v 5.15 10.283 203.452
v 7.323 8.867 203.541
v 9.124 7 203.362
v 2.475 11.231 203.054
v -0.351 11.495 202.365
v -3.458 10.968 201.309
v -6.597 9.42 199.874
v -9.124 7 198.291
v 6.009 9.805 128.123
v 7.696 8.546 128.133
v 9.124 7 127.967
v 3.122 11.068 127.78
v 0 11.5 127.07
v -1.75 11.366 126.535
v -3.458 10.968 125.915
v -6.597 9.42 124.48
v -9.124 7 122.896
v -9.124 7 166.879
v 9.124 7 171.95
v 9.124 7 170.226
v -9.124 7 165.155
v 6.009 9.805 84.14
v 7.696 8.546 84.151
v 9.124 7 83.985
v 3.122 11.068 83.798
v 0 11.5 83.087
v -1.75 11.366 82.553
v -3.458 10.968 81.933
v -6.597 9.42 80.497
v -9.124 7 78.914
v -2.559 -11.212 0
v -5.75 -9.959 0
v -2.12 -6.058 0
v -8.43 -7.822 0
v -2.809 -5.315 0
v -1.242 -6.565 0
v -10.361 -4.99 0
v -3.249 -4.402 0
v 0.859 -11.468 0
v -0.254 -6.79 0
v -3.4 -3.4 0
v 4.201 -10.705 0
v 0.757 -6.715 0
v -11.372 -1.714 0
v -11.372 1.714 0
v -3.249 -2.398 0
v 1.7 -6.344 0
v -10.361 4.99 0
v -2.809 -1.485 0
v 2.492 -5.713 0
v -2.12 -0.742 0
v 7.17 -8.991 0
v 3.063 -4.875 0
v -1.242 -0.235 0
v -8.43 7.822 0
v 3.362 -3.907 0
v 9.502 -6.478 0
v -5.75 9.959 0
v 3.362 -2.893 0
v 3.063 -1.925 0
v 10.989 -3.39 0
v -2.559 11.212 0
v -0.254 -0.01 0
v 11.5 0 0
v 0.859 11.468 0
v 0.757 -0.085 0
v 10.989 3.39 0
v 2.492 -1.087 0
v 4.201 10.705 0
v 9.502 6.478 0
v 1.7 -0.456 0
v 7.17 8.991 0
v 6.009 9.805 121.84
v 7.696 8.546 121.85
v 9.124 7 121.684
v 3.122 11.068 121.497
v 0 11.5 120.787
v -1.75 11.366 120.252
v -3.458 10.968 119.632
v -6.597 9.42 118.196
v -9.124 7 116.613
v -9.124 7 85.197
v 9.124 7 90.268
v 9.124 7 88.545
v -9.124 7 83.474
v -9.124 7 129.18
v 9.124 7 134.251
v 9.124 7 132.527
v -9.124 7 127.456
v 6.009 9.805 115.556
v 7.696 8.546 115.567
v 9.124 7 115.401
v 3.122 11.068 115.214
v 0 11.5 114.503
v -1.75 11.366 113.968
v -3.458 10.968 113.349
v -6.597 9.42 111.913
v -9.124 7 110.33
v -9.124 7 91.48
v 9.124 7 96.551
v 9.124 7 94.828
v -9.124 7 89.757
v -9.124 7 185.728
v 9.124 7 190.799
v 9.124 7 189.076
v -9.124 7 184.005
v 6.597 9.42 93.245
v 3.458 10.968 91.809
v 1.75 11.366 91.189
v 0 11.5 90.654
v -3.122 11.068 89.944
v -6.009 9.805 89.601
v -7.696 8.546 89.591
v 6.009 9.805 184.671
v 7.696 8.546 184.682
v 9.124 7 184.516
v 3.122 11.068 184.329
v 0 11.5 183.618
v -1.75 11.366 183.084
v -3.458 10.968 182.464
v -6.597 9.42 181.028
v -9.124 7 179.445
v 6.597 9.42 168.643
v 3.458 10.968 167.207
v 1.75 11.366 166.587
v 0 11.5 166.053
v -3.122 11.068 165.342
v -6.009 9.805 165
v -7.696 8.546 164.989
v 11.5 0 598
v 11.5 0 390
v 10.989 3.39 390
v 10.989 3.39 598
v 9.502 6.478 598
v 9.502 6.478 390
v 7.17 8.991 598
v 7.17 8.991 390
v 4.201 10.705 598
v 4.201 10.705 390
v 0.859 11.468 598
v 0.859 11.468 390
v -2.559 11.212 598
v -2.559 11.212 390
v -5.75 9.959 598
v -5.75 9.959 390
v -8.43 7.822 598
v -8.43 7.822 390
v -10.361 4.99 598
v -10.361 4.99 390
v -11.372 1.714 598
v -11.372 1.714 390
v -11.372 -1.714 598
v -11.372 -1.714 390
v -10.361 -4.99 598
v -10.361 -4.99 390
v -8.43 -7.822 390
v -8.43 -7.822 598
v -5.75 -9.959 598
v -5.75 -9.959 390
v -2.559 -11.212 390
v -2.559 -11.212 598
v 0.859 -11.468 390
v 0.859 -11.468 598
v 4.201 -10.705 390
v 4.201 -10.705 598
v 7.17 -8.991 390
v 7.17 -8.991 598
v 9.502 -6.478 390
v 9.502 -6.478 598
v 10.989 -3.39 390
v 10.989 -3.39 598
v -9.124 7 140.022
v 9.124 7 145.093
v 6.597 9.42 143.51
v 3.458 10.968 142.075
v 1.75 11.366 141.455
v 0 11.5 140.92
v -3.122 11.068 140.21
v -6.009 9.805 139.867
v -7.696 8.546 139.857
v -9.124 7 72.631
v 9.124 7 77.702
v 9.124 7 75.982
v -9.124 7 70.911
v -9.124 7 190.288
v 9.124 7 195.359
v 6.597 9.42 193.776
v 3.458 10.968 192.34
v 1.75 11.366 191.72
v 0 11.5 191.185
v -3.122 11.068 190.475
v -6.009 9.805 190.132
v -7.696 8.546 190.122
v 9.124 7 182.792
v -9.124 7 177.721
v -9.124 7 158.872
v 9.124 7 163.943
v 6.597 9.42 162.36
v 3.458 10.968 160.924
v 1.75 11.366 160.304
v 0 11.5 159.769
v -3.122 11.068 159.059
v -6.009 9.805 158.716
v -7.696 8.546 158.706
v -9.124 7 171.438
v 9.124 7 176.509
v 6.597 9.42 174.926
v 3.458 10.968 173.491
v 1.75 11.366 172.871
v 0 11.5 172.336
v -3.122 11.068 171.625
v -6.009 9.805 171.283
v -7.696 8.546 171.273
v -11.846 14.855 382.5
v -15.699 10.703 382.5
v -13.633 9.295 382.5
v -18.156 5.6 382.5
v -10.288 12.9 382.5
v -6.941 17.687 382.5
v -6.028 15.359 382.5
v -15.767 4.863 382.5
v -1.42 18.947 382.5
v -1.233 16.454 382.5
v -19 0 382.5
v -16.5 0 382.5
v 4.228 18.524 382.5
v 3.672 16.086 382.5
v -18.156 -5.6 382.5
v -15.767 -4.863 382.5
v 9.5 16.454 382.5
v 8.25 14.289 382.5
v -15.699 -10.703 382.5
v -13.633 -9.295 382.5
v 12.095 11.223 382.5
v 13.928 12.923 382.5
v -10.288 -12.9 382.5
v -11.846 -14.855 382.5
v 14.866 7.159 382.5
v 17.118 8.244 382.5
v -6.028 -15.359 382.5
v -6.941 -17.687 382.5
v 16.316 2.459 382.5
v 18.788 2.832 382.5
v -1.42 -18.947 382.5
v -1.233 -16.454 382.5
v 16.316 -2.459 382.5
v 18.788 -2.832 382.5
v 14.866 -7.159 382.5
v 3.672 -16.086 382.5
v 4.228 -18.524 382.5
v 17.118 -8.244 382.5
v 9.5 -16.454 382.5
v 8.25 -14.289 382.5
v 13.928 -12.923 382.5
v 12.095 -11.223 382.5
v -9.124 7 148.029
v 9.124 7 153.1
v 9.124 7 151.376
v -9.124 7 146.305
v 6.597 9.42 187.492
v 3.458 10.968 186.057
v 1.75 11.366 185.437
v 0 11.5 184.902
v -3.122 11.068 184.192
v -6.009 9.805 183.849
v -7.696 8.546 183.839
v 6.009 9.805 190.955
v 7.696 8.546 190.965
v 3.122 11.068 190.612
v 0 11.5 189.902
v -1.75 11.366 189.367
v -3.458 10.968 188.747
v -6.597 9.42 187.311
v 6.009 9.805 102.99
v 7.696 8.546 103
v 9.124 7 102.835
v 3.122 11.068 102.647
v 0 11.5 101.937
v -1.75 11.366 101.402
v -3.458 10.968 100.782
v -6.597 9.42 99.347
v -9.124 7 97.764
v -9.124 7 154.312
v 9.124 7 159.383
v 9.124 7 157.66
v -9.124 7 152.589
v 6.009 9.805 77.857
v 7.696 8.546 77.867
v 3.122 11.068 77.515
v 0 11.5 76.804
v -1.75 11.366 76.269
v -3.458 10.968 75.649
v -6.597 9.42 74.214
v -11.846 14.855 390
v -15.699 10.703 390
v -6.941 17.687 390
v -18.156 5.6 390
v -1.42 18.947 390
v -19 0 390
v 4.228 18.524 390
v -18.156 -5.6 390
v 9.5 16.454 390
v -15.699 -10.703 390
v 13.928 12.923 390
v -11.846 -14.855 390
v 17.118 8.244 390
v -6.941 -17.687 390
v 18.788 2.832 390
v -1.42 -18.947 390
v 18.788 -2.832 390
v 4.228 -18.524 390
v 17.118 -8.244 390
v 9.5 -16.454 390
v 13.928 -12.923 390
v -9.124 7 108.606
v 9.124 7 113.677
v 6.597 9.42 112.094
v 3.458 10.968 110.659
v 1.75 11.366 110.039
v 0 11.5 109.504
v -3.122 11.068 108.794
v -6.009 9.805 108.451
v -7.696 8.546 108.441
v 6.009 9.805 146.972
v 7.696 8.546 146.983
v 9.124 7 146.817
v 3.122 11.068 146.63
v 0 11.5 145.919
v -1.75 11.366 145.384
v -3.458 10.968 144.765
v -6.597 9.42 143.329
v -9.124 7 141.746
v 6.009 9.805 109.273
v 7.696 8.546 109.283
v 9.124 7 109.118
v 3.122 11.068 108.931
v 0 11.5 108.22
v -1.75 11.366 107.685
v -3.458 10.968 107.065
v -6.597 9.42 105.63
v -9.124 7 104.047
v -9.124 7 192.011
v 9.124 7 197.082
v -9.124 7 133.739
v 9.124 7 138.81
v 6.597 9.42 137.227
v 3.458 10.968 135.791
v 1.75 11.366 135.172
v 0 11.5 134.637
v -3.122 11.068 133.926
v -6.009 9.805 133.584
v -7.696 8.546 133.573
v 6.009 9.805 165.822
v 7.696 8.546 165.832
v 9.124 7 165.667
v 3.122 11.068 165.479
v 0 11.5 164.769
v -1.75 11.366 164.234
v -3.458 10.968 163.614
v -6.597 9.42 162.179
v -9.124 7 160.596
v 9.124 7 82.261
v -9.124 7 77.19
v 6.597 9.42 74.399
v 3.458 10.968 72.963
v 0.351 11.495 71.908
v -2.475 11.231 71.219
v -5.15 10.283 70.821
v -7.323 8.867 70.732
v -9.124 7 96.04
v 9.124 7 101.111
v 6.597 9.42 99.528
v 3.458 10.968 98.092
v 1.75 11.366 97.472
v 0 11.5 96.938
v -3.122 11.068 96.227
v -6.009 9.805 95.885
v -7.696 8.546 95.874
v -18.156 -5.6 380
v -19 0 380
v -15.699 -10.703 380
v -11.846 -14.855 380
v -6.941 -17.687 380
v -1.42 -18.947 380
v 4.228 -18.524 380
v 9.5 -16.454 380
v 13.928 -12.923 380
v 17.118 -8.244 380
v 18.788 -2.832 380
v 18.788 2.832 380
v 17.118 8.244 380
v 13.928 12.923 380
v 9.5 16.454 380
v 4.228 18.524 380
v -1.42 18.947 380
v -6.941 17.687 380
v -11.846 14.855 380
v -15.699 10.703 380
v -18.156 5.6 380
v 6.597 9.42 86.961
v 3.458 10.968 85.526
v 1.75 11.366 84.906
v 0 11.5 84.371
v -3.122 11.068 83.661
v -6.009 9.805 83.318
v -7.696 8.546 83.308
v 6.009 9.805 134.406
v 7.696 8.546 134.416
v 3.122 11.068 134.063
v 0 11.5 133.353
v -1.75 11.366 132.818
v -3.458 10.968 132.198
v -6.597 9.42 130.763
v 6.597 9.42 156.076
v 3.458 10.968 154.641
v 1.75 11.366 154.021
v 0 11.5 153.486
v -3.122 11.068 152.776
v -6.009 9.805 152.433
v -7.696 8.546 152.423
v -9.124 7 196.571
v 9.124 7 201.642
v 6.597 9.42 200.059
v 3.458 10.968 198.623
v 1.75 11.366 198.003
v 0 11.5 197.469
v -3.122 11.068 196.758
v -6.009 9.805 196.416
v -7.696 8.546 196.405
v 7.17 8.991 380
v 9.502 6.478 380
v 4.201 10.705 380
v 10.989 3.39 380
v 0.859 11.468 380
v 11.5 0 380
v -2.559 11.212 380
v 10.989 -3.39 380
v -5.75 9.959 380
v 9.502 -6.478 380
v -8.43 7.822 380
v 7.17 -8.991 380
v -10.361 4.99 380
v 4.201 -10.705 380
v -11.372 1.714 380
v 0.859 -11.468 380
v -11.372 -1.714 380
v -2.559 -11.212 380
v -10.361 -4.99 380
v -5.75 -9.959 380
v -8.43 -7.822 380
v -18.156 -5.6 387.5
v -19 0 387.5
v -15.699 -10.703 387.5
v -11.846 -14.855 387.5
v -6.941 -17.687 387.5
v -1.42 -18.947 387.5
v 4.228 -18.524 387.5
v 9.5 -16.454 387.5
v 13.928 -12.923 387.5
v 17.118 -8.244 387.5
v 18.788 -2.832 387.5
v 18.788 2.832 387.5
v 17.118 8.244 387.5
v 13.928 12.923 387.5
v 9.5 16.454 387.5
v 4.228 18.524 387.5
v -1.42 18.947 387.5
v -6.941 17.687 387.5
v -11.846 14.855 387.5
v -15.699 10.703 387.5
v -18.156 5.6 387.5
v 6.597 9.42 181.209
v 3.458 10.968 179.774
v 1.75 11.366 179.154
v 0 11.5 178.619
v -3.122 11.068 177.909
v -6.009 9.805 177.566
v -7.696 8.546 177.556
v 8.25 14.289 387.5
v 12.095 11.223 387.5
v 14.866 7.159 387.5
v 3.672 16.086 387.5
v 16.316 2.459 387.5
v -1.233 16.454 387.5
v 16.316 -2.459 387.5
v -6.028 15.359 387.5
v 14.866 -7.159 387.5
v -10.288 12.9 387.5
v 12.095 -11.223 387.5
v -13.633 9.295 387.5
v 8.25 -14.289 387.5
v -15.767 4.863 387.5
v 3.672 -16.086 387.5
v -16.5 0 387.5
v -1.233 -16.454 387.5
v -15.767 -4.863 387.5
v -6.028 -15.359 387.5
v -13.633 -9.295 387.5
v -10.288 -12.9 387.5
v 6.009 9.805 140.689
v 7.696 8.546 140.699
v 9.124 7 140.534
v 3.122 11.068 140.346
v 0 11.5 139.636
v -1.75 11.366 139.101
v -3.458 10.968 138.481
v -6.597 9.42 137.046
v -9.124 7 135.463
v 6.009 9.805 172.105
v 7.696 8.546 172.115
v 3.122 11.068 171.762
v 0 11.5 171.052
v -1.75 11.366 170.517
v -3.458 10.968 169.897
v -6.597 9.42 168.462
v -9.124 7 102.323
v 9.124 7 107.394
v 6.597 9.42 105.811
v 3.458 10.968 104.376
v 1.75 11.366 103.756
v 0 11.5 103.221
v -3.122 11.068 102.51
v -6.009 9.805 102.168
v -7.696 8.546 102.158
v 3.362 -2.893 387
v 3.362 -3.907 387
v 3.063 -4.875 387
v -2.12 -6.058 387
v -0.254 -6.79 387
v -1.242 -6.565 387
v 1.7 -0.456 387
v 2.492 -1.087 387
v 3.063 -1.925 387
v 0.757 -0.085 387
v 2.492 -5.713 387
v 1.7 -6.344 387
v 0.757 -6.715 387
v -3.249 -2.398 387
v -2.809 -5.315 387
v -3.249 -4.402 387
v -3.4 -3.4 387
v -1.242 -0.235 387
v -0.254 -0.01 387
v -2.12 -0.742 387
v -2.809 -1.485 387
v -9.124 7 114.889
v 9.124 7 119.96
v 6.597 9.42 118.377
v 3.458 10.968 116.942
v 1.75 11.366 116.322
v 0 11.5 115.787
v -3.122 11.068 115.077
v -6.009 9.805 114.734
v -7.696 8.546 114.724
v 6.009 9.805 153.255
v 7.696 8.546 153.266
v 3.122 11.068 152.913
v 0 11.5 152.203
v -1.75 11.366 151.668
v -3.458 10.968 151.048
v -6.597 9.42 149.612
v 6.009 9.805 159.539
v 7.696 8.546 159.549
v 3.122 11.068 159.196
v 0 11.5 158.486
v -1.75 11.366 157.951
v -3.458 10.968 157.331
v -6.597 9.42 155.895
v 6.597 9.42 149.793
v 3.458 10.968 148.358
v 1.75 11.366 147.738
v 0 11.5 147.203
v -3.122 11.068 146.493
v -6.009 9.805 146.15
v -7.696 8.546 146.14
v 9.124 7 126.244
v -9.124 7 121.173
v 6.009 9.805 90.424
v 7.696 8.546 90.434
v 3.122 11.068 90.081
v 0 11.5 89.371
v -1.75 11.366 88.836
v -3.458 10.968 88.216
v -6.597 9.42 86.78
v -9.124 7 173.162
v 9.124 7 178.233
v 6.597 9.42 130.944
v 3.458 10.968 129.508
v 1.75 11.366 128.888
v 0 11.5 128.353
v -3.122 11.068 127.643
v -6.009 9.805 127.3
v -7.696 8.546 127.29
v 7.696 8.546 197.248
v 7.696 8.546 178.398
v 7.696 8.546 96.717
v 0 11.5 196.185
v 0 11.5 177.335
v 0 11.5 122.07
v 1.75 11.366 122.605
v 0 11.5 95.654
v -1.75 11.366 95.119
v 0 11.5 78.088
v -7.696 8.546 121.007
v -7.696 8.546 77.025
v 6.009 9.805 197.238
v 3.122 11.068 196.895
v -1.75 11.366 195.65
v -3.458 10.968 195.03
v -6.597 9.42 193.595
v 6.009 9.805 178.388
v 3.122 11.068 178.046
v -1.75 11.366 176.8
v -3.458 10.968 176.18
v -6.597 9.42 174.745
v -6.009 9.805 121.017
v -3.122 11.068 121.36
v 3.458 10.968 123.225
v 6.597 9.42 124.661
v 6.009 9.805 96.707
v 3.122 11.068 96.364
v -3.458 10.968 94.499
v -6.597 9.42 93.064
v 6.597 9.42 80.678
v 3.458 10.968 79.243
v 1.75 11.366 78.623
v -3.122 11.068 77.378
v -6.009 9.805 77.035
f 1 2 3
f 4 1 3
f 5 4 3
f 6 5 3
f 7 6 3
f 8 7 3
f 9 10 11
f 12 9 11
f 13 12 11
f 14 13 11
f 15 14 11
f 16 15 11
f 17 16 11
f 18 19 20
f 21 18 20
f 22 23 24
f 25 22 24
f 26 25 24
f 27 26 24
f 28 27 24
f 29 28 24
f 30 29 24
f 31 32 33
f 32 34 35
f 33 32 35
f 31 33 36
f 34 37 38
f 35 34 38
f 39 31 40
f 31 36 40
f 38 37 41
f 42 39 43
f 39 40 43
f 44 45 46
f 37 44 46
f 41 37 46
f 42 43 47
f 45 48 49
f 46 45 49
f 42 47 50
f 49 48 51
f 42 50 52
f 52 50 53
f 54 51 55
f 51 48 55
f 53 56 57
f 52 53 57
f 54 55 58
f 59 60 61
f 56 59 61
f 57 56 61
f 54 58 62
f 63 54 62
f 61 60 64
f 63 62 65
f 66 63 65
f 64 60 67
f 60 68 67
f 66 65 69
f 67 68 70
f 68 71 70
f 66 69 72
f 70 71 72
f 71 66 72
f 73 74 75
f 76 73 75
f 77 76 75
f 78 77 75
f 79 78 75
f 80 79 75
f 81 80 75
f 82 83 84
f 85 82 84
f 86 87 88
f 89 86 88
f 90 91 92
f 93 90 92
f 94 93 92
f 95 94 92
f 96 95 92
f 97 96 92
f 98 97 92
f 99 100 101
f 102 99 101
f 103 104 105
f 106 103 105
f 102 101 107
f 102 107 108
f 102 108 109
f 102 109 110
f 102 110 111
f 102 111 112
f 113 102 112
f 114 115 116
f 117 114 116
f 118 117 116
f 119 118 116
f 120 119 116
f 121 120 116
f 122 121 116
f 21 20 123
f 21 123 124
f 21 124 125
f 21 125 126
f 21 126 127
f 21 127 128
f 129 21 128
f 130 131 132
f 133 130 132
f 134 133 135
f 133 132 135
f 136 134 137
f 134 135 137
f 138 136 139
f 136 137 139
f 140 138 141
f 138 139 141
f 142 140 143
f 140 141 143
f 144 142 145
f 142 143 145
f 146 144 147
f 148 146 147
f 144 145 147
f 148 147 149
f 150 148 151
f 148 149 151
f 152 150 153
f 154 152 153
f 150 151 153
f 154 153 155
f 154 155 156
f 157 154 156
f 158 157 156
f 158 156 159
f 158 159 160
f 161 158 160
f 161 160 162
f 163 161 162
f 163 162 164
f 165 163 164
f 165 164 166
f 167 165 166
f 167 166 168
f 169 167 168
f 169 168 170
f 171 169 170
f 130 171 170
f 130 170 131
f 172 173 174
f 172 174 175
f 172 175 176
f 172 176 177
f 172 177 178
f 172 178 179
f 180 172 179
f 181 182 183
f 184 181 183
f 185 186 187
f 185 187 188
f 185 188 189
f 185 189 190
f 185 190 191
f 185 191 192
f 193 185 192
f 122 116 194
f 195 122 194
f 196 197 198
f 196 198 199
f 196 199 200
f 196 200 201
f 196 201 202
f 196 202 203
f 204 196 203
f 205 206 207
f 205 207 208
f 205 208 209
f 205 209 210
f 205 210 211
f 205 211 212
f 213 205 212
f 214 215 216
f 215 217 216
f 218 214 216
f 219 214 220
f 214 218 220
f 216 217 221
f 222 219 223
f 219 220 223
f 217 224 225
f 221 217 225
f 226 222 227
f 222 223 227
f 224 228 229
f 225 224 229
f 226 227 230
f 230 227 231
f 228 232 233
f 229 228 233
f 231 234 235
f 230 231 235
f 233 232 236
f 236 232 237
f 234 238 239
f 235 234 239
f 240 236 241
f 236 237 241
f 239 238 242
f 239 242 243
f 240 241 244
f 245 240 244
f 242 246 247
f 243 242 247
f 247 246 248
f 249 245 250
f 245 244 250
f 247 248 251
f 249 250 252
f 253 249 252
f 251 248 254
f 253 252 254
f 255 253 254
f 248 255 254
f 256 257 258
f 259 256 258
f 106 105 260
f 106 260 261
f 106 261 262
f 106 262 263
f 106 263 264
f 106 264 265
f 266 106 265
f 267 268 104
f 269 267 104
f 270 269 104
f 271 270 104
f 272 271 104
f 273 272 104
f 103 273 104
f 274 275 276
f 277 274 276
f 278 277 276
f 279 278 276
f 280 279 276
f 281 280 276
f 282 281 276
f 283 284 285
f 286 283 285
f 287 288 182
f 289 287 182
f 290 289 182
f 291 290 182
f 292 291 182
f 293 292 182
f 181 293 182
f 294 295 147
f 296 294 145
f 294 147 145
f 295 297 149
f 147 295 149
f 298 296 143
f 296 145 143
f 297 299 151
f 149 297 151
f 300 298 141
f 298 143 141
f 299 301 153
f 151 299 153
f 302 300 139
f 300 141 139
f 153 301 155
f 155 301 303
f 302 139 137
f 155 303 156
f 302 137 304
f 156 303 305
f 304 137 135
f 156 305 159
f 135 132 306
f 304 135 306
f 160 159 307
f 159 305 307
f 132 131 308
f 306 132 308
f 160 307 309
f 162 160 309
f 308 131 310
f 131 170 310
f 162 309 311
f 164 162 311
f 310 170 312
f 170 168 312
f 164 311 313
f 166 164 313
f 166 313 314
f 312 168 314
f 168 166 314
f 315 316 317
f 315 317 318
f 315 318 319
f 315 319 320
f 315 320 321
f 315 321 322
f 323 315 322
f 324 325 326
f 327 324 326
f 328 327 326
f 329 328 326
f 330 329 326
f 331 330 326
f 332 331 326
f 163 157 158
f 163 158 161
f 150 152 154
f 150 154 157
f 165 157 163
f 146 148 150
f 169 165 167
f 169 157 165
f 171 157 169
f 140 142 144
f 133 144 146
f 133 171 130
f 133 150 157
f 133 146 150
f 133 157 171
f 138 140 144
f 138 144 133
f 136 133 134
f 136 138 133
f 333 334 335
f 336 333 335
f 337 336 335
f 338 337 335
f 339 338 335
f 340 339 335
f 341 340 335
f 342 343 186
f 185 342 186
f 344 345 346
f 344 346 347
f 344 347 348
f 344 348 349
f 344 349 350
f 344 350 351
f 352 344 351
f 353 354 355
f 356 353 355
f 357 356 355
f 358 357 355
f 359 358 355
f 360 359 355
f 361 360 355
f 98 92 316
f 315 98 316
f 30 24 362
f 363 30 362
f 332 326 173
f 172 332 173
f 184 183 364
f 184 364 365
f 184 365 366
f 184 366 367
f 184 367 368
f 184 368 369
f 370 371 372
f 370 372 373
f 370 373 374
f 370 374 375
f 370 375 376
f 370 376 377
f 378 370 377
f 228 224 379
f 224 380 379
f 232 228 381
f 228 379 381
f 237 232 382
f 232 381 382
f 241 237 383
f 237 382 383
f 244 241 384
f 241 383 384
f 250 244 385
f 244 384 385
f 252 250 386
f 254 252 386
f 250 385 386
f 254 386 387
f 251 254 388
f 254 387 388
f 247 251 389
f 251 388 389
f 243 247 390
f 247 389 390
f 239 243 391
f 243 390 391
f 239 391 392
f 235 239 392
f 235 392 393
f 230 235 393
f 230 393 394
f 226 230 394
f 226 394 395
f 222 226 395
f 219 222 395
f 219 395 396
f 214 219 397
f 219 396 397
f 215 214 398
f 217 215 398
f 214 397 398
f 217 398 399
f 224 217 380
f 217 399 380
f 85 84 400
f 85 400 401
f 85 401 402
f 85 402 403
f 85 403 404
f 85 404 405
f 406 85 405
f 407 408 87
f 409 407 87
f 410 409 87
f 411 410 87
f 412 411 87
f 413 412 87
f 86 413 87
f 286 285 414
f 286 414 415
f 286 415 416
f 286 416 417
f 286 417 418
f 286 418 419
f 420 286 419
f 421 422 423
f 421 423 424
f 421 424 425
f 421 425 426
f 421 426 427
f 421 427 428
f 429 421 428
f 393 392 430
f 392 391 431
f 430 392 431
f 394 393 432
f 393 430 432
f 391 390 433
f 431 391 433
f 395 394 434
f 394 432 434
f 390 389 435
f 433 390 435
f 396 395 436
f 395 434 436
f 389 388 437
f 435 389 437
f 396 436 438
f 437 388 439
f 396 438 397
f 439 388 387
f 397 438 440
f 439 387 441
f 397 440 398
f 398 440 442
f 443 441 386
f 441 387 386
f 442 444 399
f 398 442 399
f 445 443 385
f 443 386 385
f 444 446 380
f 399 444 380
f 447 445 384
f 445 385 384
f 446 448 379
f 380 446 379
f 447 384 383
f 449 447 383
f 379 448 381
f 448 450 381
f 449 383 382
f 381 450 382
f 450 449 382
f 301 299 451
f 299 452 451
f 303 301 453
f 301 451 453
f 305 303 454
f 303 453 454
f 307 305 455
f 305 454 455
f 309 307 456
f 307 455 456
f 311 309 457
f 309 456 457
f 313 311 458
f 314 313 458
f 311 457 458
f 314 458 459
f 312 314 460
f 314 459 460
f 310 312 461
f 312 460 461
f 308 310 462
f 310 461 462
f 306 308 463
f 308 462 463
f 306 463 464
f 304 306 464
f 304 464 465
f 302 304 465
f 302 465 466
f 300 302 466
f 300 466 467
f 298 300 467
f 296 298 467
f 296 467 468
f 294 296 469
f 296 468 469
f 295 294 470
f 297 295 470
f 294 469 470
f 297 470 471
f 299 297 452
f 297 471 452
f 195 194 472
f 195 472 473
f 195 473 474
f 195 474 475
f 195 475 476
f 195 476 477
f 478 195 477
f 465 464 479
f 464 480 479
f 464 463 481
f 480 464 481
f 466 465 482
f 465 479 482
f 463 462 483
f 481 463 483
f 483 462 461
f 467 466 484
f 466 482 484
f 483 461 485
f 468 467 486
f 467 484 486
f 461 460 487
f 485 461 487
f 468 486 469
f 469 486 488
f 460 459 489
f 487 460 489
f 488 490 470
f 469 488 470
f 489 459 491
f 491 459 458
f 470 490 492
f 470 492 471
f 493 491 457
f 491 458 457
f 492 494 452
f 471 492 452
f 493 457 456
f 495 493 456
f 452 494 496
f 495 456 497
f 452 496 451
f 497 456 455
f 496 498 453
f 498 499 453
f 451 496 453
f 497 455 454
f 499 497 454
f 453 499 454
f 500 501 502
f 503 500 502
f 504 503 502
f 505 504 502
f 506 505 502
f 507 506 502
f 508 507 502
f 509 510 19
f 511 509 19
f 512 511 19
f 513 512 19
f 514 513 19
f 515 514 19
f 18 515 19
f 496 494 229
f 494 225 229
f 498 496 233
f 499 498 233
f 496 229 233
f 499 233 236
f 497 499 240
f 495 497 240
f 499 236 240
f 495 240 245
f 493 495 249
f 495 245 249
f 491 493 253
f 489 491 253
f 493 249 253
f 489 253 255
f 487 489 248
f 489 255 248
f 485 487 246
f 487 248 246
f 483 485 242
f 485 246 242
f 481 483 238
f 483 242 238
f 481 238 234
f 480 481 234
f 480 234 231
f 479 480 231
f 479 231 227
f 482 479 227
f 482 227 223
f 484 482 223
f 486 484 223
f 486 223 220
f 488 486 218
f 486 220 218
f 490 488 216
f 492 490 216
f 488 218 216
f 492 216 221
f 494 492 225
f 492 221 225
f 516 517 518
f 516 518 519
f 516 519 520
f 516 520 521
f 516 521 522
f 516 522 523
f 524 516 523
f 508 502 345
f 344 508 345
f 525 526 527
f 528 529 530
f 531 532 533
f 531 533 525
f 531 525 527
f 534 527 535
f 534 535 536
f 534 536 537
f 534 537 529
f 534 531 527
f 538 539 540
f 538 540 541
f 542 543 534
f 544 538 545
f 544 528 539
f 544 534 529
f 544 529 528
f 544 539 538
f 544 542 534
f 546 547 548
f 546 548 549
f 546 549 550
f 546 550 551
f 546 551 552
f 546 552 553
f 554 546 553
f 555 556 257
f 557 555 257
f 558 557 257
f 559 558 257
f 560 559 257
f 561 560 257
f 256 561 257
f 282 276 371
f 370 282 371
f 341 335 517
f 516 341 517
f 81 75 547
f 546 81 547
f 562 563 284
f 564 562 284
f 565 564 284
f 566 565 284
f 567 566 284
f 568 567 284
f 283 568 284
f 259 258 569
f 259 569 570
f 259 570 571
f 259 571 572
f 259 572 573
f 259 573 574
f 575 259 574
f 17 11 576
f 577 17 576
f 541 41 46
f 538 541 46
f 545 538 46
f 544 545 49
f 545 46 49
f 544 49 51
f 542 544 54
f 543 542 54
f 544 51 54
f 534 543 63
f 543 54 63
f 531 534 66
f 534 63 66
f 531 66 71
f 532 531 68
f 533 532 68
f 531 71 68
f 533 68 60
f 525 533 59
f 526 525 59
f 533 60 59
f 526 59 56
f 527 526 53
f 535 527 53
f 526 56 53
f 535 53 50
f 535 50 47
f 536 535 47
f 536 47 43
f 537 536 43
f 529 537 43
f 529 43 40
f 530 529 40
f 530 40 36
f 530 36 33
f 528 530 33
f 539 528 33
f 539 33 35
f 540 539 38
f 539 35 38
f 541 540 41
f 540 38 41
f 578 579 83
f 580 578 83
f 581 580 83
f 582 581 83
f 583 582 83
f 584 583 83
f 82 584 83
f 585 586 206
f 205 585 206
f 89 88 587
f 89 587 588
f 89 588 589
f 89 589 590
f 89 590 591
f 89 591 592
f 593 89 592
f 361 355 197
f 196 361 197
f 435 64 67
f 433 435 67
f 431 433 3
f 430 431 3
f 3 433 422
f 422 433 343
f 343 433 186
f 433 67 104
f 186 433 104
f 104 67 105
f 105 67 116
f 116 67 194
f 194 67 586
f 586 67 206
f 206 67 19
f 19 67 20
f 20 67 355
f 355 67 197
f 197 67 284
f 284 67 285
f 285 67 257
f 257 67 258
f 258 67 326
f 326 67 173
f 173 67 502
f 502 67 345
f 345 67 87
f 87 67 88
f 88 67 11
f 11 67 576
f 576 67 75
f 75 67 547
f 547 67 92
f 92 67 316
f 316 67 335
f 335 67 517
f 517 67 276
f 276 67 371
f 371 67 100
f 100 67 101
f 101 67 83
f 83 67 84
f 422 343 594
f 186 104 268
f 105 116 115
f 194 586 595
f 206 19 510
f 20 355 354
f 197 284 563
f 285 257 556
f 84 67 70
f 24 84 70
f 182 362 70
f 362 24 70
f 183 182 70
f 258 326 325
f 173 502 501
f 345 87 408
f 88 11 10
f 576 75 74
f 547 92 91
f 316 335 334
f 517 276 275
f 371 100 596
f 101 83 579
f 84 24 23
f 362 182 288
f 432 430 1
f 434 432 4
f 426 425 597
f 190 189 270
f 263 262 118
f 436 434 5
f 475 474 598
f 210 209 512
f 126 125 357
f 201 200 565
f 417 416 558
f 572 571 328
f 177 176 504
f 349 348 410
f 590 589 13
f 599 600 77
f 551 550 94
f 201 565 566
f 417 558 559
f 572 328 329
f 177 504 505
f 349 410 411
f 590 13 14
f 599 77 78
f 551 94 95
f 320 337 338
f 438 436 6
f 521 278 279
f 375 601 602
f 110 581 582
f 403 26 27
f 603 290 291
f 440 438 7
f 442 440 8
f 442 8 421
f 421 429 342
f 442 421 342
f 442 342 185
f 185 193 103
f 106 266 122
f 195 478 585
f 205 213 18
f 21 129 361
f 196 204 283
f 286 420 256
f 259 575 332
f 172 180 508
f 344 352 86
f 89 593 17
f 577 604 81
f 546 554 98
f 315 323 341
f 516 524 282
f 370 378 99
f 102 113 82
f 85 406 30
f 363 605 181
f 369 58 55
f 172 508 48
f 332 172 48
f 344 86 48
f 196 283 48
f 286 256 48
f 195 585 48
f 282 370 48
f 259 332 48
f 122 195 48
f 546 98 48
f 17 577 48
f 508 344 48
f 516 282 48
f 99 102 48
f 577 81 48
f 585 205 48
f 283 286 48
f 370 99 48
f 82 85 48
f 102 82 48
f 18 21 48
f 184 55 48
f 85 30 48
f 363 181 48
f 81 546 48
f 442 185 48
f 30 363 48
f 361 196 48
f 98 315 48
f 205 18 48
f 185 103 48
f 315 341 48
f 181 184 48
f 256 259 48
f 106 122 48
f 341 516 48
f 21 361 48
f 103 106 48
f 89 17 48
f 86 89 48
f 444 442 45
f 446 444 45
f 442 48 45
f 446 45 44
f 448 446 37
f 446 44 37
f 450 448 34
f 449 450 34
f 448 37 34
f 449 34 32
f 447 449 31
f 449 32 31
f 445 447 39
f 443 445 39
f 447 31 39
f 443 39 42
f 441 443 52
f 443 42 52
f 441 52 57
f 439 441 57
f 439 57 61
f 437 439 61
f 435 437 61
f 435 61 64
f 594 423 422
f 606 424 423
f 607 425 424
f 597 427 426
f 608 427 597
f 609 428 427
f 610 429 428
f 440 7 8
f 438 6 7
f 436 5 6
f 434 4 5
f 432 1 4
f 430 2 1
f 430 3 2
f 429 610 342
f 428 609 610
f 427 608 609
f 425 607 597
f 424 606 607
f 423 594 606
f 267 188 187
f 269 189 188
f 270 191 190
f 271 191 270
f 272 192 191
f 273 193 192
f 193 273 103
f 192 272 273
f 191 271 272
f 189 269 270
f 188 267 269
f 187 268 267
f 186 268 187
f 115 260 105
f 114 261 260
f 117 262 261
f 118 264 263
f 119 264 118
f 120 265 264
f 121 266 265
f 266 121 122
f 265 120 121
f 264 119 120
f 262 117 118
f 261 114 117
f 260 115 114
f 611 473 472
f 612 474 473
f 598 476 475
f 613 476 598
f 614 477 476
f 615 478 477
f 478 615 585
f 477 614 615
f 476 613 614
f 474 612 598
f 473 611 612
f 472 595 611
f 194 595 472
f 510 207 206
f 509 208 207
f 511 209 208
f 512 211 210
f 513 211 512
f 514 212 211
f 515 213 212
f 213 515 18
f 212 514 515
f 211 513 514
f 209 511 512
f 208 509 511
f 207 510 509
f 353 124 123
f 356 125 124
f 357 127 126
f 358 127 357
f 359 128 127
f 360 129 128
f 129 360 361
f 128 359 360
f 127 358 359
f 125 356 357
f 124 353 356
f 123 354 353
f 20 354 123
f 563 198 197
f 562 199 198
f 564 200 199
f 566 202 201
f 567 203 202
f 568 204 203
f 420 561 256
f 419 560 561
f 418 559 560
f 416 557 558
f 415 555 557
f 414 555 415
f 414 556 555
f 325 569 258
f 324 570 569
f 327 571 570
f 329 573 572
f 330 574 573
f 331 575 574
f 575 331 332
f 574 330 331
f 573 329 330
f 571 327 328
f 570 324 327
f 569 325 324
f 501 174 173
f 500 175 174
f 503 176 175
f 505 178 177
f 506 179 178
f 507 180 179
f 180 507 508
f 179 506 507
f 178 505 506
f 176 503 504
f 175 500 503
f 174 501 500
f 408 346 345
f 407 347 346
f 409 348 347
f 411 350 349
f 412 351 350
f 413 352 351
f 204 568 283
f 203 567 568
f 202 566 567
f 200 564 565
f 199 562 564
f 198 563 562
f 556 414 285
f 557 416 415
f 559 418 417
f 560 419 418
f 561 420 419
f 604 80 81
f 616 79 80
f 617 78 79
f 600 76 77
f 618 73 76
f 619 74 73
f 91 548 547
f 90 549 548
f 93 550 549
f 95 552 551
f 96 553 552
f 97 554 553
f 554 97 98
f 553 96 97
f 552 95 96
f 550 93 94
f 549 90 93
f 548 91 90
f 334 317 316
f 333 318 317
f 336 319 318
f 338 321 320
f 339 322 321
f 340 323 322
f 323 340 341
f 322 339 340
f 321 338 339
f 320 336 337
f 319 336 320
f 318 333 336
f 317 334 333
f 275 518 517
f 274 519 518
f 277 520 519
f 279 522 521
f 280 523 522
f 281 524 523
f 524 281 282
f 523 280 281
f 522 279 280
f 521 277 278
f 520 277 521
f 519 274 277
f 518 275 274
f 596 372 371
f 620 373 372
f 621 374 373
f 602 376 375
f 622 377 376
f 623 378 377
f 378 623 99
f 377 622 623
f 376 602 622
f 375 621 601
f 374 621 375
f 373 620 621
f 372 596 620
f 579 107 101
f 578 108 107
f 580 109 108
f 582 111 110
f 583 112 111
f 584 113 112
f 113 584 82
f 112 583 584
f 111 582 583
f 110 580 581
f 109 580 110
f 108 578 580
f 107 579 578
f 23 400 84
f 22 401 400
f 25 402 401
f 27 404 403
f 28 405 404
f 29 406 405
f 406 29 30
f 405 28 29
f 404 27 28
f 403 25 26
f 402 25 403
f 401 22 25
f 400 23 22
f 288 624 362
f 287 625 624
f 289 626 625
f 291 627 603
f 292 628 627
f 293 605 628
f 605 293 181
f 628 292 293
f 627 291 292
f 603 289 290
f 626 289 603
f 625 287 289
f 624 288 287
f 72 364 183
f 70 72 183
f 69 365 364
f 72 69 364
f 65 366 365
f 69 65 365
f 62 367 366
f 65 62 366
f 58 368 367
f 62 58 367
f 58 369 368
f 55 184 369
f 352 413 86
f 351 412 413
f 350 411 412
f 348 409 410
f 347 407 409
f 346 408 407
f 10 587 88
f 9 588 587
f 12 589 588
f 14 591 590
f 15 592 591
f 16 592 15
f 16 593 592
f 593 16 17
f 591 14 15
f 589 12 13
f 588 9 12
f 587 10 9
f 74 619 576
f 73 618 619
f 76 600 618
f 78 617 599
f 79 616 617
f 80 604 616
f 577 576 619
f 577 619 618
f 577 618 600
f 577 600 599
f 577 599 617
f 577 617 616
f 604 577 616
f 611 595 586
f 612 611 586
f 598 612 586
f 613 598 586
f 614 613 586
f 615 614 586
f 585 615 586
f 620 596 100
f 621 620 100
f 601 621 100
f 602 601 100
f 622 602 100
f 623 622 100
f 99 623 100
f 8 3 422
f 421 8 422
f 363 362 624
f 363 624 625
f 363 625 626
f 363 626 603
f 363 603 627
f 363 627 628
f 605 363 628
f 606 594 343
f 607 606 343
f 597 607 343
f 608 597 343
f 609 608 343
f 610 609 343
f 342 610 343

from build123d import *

# Parameters (mm, degrees)
IZIM5_R                     = 11.5
Y_KSEKLIK_EKSTR_ZYON2_DEPTH = 598
IZIM12_R                    = 3.4
KES_EKSTR_ZYON1_DEPTH       = 387


with BuildPart() as part:
    # Çizim5 → Yükseklik-Ekstrüzyon2 (new body)
    with BuildSketch(Plane.XY):
        Circle(IZIM5_R)
    extrude(amount=Y_KSEKLIK_EKSTR_ZYON2_DEPTH)

    # Kes-Süpür2: sweep along a path in Çizim7
    with BuildLine(Plane(origin=(0, 0, 0), x_dir=(1, 0, 0), z_dir=(0, 1, 0))) as kes_s_p_r2_path:
        Line((11.5, -47.002601747), (-17.141789086, -39.043378107))
    # Çizim6 → Kes-Süpür2 (sweep, cut)
    with BuildSketch(Plane(origin=(11.5, 0, 0), x_dir=(0, 0, -1), z_dir=(1, 0, 0))):
        Polygon((-78.362133946, 7), (-80, 11.5), (-81.283711713, 11.5), (-82.921577767, 7), (-84.645319246, 7), (-86.2831853, 11.5), (-87.566897013, 11.5), (-89.204763067, 7), (-90.928504546, 7), (-92.5663706, 11.5), (-93.850082313, 11.5), (-95.487948367, 7), (-97.211689846, 7), (-98.8495559, 11.5), (-100.133267613, 11.5), (-101.771133667, 7), (-103.494875146, 7), (-105.1327412, 11.5), (-106.416452913, 11.5), (-108.054318967, 7), (-109.778060446, 7), (-111.4159265, 11.5), (-112.699638213, 11.5), (-114.337504267, 7), (-116.061245746, 7), (-117.6991118, 11.5), (-118.982823513, 11.5), (-120.620689567, 7), (-122.344431046, 7), (-123.9822971, 11.5), (-125.266008813, 11.5), (-126.903874867, 7), (-128.627616346, 7), (-130.2654824, 11.5), (-131.549194113, 11.5), (-133.187060167, 7), (-134.910801646, 7), (-136.5486677, 11.5), (-137.832379413, 11.5), (-139.470245467, 7), (-141.193986946, 7), (-142.831853, 11.5), (-144.115564713, 11.5), (-145.753430767, 7), (-147.477172246, 7), (-149.1150383, 11.5), (-150.398750013, 11.5), (-152.036616067, 7), (-153.760357546, 7), (-155.3982236, 11.5), (-156.681935313, 11.5), (-158.319801367, 7), (-160.043542846, 7), (-161.6814089, 11.5), (-162.965120613, 11.5), (-164.602986667, 7), (-166.326728146, 7), (-167.9645942, 11.5), (-169.248305913, 11.5), (-170.886171967, 7), (-172.609913446, 7), (-174.2477795, 11.5), (-175.531491213, 11.5), (-177.169357267, 7), (-178.893098746, 7), (-180.5309648, 11.5), (-181.814676513, 11.5), (-183.452542567, 7), (-185.176284046, 7), (-186.8141501, 11.5), (-188.097861813, 11.5), (-189.735727867, 7), (-191.459469346, 7), (-193.0973354, 11.5), (-194.381047113, 11.5), (-196.018913167, 7), (-197.742654646, 7), (-199.3805207, 11.5), (-200.664232413, 11.5), (-202.302098467, 7), (-204.022098467, 7), (-206.232393599, 13.072735964), (-74.431838814, 13.072735964), (-76.642133946, 7), align=None)
    sweep(path=kes_s_p_r2_path.line, mode=Mode.SUBTRACT)

    # Çizim11 → Döndür1 (revolve)
    with BuildSketch(Plane(origin=(0, 0, 0), x_dir=(0, 0, -1), z_dir=(1, 0, 0)), mode=Mode.PRIVATE) as d_nd_r1_sk:
        Polygon((-380, 19), (-380, 11.5), (-390, 11.5), (-390, 19), (-387.5, 19), (-387.5, 16.5), (-382.5, 16.5), (-382.5, 19), align=None)
    revolve(d_nd_r1_sk.sketch.rotate(Axis((0, 0, 0), (0, 0, 1)), 90), axis=Axis((0, 0, 0), (0, 0, 1)))

    # Çizim12 → Kes-Ekstrüzyon1 (cut)
    with BuildSketch(Plane(origin=(0, 0, 0), x_dir=(-1, 0, 0), z_dir=(0, 0, -1))):
        with Locations((0, -3.4)):
            Circle(IZIM12_R)
    extrude(amount=-KES_EKSTR_ZYON1_DEPTH, mode=Mode.SUBTRACT)


solid = part.part
